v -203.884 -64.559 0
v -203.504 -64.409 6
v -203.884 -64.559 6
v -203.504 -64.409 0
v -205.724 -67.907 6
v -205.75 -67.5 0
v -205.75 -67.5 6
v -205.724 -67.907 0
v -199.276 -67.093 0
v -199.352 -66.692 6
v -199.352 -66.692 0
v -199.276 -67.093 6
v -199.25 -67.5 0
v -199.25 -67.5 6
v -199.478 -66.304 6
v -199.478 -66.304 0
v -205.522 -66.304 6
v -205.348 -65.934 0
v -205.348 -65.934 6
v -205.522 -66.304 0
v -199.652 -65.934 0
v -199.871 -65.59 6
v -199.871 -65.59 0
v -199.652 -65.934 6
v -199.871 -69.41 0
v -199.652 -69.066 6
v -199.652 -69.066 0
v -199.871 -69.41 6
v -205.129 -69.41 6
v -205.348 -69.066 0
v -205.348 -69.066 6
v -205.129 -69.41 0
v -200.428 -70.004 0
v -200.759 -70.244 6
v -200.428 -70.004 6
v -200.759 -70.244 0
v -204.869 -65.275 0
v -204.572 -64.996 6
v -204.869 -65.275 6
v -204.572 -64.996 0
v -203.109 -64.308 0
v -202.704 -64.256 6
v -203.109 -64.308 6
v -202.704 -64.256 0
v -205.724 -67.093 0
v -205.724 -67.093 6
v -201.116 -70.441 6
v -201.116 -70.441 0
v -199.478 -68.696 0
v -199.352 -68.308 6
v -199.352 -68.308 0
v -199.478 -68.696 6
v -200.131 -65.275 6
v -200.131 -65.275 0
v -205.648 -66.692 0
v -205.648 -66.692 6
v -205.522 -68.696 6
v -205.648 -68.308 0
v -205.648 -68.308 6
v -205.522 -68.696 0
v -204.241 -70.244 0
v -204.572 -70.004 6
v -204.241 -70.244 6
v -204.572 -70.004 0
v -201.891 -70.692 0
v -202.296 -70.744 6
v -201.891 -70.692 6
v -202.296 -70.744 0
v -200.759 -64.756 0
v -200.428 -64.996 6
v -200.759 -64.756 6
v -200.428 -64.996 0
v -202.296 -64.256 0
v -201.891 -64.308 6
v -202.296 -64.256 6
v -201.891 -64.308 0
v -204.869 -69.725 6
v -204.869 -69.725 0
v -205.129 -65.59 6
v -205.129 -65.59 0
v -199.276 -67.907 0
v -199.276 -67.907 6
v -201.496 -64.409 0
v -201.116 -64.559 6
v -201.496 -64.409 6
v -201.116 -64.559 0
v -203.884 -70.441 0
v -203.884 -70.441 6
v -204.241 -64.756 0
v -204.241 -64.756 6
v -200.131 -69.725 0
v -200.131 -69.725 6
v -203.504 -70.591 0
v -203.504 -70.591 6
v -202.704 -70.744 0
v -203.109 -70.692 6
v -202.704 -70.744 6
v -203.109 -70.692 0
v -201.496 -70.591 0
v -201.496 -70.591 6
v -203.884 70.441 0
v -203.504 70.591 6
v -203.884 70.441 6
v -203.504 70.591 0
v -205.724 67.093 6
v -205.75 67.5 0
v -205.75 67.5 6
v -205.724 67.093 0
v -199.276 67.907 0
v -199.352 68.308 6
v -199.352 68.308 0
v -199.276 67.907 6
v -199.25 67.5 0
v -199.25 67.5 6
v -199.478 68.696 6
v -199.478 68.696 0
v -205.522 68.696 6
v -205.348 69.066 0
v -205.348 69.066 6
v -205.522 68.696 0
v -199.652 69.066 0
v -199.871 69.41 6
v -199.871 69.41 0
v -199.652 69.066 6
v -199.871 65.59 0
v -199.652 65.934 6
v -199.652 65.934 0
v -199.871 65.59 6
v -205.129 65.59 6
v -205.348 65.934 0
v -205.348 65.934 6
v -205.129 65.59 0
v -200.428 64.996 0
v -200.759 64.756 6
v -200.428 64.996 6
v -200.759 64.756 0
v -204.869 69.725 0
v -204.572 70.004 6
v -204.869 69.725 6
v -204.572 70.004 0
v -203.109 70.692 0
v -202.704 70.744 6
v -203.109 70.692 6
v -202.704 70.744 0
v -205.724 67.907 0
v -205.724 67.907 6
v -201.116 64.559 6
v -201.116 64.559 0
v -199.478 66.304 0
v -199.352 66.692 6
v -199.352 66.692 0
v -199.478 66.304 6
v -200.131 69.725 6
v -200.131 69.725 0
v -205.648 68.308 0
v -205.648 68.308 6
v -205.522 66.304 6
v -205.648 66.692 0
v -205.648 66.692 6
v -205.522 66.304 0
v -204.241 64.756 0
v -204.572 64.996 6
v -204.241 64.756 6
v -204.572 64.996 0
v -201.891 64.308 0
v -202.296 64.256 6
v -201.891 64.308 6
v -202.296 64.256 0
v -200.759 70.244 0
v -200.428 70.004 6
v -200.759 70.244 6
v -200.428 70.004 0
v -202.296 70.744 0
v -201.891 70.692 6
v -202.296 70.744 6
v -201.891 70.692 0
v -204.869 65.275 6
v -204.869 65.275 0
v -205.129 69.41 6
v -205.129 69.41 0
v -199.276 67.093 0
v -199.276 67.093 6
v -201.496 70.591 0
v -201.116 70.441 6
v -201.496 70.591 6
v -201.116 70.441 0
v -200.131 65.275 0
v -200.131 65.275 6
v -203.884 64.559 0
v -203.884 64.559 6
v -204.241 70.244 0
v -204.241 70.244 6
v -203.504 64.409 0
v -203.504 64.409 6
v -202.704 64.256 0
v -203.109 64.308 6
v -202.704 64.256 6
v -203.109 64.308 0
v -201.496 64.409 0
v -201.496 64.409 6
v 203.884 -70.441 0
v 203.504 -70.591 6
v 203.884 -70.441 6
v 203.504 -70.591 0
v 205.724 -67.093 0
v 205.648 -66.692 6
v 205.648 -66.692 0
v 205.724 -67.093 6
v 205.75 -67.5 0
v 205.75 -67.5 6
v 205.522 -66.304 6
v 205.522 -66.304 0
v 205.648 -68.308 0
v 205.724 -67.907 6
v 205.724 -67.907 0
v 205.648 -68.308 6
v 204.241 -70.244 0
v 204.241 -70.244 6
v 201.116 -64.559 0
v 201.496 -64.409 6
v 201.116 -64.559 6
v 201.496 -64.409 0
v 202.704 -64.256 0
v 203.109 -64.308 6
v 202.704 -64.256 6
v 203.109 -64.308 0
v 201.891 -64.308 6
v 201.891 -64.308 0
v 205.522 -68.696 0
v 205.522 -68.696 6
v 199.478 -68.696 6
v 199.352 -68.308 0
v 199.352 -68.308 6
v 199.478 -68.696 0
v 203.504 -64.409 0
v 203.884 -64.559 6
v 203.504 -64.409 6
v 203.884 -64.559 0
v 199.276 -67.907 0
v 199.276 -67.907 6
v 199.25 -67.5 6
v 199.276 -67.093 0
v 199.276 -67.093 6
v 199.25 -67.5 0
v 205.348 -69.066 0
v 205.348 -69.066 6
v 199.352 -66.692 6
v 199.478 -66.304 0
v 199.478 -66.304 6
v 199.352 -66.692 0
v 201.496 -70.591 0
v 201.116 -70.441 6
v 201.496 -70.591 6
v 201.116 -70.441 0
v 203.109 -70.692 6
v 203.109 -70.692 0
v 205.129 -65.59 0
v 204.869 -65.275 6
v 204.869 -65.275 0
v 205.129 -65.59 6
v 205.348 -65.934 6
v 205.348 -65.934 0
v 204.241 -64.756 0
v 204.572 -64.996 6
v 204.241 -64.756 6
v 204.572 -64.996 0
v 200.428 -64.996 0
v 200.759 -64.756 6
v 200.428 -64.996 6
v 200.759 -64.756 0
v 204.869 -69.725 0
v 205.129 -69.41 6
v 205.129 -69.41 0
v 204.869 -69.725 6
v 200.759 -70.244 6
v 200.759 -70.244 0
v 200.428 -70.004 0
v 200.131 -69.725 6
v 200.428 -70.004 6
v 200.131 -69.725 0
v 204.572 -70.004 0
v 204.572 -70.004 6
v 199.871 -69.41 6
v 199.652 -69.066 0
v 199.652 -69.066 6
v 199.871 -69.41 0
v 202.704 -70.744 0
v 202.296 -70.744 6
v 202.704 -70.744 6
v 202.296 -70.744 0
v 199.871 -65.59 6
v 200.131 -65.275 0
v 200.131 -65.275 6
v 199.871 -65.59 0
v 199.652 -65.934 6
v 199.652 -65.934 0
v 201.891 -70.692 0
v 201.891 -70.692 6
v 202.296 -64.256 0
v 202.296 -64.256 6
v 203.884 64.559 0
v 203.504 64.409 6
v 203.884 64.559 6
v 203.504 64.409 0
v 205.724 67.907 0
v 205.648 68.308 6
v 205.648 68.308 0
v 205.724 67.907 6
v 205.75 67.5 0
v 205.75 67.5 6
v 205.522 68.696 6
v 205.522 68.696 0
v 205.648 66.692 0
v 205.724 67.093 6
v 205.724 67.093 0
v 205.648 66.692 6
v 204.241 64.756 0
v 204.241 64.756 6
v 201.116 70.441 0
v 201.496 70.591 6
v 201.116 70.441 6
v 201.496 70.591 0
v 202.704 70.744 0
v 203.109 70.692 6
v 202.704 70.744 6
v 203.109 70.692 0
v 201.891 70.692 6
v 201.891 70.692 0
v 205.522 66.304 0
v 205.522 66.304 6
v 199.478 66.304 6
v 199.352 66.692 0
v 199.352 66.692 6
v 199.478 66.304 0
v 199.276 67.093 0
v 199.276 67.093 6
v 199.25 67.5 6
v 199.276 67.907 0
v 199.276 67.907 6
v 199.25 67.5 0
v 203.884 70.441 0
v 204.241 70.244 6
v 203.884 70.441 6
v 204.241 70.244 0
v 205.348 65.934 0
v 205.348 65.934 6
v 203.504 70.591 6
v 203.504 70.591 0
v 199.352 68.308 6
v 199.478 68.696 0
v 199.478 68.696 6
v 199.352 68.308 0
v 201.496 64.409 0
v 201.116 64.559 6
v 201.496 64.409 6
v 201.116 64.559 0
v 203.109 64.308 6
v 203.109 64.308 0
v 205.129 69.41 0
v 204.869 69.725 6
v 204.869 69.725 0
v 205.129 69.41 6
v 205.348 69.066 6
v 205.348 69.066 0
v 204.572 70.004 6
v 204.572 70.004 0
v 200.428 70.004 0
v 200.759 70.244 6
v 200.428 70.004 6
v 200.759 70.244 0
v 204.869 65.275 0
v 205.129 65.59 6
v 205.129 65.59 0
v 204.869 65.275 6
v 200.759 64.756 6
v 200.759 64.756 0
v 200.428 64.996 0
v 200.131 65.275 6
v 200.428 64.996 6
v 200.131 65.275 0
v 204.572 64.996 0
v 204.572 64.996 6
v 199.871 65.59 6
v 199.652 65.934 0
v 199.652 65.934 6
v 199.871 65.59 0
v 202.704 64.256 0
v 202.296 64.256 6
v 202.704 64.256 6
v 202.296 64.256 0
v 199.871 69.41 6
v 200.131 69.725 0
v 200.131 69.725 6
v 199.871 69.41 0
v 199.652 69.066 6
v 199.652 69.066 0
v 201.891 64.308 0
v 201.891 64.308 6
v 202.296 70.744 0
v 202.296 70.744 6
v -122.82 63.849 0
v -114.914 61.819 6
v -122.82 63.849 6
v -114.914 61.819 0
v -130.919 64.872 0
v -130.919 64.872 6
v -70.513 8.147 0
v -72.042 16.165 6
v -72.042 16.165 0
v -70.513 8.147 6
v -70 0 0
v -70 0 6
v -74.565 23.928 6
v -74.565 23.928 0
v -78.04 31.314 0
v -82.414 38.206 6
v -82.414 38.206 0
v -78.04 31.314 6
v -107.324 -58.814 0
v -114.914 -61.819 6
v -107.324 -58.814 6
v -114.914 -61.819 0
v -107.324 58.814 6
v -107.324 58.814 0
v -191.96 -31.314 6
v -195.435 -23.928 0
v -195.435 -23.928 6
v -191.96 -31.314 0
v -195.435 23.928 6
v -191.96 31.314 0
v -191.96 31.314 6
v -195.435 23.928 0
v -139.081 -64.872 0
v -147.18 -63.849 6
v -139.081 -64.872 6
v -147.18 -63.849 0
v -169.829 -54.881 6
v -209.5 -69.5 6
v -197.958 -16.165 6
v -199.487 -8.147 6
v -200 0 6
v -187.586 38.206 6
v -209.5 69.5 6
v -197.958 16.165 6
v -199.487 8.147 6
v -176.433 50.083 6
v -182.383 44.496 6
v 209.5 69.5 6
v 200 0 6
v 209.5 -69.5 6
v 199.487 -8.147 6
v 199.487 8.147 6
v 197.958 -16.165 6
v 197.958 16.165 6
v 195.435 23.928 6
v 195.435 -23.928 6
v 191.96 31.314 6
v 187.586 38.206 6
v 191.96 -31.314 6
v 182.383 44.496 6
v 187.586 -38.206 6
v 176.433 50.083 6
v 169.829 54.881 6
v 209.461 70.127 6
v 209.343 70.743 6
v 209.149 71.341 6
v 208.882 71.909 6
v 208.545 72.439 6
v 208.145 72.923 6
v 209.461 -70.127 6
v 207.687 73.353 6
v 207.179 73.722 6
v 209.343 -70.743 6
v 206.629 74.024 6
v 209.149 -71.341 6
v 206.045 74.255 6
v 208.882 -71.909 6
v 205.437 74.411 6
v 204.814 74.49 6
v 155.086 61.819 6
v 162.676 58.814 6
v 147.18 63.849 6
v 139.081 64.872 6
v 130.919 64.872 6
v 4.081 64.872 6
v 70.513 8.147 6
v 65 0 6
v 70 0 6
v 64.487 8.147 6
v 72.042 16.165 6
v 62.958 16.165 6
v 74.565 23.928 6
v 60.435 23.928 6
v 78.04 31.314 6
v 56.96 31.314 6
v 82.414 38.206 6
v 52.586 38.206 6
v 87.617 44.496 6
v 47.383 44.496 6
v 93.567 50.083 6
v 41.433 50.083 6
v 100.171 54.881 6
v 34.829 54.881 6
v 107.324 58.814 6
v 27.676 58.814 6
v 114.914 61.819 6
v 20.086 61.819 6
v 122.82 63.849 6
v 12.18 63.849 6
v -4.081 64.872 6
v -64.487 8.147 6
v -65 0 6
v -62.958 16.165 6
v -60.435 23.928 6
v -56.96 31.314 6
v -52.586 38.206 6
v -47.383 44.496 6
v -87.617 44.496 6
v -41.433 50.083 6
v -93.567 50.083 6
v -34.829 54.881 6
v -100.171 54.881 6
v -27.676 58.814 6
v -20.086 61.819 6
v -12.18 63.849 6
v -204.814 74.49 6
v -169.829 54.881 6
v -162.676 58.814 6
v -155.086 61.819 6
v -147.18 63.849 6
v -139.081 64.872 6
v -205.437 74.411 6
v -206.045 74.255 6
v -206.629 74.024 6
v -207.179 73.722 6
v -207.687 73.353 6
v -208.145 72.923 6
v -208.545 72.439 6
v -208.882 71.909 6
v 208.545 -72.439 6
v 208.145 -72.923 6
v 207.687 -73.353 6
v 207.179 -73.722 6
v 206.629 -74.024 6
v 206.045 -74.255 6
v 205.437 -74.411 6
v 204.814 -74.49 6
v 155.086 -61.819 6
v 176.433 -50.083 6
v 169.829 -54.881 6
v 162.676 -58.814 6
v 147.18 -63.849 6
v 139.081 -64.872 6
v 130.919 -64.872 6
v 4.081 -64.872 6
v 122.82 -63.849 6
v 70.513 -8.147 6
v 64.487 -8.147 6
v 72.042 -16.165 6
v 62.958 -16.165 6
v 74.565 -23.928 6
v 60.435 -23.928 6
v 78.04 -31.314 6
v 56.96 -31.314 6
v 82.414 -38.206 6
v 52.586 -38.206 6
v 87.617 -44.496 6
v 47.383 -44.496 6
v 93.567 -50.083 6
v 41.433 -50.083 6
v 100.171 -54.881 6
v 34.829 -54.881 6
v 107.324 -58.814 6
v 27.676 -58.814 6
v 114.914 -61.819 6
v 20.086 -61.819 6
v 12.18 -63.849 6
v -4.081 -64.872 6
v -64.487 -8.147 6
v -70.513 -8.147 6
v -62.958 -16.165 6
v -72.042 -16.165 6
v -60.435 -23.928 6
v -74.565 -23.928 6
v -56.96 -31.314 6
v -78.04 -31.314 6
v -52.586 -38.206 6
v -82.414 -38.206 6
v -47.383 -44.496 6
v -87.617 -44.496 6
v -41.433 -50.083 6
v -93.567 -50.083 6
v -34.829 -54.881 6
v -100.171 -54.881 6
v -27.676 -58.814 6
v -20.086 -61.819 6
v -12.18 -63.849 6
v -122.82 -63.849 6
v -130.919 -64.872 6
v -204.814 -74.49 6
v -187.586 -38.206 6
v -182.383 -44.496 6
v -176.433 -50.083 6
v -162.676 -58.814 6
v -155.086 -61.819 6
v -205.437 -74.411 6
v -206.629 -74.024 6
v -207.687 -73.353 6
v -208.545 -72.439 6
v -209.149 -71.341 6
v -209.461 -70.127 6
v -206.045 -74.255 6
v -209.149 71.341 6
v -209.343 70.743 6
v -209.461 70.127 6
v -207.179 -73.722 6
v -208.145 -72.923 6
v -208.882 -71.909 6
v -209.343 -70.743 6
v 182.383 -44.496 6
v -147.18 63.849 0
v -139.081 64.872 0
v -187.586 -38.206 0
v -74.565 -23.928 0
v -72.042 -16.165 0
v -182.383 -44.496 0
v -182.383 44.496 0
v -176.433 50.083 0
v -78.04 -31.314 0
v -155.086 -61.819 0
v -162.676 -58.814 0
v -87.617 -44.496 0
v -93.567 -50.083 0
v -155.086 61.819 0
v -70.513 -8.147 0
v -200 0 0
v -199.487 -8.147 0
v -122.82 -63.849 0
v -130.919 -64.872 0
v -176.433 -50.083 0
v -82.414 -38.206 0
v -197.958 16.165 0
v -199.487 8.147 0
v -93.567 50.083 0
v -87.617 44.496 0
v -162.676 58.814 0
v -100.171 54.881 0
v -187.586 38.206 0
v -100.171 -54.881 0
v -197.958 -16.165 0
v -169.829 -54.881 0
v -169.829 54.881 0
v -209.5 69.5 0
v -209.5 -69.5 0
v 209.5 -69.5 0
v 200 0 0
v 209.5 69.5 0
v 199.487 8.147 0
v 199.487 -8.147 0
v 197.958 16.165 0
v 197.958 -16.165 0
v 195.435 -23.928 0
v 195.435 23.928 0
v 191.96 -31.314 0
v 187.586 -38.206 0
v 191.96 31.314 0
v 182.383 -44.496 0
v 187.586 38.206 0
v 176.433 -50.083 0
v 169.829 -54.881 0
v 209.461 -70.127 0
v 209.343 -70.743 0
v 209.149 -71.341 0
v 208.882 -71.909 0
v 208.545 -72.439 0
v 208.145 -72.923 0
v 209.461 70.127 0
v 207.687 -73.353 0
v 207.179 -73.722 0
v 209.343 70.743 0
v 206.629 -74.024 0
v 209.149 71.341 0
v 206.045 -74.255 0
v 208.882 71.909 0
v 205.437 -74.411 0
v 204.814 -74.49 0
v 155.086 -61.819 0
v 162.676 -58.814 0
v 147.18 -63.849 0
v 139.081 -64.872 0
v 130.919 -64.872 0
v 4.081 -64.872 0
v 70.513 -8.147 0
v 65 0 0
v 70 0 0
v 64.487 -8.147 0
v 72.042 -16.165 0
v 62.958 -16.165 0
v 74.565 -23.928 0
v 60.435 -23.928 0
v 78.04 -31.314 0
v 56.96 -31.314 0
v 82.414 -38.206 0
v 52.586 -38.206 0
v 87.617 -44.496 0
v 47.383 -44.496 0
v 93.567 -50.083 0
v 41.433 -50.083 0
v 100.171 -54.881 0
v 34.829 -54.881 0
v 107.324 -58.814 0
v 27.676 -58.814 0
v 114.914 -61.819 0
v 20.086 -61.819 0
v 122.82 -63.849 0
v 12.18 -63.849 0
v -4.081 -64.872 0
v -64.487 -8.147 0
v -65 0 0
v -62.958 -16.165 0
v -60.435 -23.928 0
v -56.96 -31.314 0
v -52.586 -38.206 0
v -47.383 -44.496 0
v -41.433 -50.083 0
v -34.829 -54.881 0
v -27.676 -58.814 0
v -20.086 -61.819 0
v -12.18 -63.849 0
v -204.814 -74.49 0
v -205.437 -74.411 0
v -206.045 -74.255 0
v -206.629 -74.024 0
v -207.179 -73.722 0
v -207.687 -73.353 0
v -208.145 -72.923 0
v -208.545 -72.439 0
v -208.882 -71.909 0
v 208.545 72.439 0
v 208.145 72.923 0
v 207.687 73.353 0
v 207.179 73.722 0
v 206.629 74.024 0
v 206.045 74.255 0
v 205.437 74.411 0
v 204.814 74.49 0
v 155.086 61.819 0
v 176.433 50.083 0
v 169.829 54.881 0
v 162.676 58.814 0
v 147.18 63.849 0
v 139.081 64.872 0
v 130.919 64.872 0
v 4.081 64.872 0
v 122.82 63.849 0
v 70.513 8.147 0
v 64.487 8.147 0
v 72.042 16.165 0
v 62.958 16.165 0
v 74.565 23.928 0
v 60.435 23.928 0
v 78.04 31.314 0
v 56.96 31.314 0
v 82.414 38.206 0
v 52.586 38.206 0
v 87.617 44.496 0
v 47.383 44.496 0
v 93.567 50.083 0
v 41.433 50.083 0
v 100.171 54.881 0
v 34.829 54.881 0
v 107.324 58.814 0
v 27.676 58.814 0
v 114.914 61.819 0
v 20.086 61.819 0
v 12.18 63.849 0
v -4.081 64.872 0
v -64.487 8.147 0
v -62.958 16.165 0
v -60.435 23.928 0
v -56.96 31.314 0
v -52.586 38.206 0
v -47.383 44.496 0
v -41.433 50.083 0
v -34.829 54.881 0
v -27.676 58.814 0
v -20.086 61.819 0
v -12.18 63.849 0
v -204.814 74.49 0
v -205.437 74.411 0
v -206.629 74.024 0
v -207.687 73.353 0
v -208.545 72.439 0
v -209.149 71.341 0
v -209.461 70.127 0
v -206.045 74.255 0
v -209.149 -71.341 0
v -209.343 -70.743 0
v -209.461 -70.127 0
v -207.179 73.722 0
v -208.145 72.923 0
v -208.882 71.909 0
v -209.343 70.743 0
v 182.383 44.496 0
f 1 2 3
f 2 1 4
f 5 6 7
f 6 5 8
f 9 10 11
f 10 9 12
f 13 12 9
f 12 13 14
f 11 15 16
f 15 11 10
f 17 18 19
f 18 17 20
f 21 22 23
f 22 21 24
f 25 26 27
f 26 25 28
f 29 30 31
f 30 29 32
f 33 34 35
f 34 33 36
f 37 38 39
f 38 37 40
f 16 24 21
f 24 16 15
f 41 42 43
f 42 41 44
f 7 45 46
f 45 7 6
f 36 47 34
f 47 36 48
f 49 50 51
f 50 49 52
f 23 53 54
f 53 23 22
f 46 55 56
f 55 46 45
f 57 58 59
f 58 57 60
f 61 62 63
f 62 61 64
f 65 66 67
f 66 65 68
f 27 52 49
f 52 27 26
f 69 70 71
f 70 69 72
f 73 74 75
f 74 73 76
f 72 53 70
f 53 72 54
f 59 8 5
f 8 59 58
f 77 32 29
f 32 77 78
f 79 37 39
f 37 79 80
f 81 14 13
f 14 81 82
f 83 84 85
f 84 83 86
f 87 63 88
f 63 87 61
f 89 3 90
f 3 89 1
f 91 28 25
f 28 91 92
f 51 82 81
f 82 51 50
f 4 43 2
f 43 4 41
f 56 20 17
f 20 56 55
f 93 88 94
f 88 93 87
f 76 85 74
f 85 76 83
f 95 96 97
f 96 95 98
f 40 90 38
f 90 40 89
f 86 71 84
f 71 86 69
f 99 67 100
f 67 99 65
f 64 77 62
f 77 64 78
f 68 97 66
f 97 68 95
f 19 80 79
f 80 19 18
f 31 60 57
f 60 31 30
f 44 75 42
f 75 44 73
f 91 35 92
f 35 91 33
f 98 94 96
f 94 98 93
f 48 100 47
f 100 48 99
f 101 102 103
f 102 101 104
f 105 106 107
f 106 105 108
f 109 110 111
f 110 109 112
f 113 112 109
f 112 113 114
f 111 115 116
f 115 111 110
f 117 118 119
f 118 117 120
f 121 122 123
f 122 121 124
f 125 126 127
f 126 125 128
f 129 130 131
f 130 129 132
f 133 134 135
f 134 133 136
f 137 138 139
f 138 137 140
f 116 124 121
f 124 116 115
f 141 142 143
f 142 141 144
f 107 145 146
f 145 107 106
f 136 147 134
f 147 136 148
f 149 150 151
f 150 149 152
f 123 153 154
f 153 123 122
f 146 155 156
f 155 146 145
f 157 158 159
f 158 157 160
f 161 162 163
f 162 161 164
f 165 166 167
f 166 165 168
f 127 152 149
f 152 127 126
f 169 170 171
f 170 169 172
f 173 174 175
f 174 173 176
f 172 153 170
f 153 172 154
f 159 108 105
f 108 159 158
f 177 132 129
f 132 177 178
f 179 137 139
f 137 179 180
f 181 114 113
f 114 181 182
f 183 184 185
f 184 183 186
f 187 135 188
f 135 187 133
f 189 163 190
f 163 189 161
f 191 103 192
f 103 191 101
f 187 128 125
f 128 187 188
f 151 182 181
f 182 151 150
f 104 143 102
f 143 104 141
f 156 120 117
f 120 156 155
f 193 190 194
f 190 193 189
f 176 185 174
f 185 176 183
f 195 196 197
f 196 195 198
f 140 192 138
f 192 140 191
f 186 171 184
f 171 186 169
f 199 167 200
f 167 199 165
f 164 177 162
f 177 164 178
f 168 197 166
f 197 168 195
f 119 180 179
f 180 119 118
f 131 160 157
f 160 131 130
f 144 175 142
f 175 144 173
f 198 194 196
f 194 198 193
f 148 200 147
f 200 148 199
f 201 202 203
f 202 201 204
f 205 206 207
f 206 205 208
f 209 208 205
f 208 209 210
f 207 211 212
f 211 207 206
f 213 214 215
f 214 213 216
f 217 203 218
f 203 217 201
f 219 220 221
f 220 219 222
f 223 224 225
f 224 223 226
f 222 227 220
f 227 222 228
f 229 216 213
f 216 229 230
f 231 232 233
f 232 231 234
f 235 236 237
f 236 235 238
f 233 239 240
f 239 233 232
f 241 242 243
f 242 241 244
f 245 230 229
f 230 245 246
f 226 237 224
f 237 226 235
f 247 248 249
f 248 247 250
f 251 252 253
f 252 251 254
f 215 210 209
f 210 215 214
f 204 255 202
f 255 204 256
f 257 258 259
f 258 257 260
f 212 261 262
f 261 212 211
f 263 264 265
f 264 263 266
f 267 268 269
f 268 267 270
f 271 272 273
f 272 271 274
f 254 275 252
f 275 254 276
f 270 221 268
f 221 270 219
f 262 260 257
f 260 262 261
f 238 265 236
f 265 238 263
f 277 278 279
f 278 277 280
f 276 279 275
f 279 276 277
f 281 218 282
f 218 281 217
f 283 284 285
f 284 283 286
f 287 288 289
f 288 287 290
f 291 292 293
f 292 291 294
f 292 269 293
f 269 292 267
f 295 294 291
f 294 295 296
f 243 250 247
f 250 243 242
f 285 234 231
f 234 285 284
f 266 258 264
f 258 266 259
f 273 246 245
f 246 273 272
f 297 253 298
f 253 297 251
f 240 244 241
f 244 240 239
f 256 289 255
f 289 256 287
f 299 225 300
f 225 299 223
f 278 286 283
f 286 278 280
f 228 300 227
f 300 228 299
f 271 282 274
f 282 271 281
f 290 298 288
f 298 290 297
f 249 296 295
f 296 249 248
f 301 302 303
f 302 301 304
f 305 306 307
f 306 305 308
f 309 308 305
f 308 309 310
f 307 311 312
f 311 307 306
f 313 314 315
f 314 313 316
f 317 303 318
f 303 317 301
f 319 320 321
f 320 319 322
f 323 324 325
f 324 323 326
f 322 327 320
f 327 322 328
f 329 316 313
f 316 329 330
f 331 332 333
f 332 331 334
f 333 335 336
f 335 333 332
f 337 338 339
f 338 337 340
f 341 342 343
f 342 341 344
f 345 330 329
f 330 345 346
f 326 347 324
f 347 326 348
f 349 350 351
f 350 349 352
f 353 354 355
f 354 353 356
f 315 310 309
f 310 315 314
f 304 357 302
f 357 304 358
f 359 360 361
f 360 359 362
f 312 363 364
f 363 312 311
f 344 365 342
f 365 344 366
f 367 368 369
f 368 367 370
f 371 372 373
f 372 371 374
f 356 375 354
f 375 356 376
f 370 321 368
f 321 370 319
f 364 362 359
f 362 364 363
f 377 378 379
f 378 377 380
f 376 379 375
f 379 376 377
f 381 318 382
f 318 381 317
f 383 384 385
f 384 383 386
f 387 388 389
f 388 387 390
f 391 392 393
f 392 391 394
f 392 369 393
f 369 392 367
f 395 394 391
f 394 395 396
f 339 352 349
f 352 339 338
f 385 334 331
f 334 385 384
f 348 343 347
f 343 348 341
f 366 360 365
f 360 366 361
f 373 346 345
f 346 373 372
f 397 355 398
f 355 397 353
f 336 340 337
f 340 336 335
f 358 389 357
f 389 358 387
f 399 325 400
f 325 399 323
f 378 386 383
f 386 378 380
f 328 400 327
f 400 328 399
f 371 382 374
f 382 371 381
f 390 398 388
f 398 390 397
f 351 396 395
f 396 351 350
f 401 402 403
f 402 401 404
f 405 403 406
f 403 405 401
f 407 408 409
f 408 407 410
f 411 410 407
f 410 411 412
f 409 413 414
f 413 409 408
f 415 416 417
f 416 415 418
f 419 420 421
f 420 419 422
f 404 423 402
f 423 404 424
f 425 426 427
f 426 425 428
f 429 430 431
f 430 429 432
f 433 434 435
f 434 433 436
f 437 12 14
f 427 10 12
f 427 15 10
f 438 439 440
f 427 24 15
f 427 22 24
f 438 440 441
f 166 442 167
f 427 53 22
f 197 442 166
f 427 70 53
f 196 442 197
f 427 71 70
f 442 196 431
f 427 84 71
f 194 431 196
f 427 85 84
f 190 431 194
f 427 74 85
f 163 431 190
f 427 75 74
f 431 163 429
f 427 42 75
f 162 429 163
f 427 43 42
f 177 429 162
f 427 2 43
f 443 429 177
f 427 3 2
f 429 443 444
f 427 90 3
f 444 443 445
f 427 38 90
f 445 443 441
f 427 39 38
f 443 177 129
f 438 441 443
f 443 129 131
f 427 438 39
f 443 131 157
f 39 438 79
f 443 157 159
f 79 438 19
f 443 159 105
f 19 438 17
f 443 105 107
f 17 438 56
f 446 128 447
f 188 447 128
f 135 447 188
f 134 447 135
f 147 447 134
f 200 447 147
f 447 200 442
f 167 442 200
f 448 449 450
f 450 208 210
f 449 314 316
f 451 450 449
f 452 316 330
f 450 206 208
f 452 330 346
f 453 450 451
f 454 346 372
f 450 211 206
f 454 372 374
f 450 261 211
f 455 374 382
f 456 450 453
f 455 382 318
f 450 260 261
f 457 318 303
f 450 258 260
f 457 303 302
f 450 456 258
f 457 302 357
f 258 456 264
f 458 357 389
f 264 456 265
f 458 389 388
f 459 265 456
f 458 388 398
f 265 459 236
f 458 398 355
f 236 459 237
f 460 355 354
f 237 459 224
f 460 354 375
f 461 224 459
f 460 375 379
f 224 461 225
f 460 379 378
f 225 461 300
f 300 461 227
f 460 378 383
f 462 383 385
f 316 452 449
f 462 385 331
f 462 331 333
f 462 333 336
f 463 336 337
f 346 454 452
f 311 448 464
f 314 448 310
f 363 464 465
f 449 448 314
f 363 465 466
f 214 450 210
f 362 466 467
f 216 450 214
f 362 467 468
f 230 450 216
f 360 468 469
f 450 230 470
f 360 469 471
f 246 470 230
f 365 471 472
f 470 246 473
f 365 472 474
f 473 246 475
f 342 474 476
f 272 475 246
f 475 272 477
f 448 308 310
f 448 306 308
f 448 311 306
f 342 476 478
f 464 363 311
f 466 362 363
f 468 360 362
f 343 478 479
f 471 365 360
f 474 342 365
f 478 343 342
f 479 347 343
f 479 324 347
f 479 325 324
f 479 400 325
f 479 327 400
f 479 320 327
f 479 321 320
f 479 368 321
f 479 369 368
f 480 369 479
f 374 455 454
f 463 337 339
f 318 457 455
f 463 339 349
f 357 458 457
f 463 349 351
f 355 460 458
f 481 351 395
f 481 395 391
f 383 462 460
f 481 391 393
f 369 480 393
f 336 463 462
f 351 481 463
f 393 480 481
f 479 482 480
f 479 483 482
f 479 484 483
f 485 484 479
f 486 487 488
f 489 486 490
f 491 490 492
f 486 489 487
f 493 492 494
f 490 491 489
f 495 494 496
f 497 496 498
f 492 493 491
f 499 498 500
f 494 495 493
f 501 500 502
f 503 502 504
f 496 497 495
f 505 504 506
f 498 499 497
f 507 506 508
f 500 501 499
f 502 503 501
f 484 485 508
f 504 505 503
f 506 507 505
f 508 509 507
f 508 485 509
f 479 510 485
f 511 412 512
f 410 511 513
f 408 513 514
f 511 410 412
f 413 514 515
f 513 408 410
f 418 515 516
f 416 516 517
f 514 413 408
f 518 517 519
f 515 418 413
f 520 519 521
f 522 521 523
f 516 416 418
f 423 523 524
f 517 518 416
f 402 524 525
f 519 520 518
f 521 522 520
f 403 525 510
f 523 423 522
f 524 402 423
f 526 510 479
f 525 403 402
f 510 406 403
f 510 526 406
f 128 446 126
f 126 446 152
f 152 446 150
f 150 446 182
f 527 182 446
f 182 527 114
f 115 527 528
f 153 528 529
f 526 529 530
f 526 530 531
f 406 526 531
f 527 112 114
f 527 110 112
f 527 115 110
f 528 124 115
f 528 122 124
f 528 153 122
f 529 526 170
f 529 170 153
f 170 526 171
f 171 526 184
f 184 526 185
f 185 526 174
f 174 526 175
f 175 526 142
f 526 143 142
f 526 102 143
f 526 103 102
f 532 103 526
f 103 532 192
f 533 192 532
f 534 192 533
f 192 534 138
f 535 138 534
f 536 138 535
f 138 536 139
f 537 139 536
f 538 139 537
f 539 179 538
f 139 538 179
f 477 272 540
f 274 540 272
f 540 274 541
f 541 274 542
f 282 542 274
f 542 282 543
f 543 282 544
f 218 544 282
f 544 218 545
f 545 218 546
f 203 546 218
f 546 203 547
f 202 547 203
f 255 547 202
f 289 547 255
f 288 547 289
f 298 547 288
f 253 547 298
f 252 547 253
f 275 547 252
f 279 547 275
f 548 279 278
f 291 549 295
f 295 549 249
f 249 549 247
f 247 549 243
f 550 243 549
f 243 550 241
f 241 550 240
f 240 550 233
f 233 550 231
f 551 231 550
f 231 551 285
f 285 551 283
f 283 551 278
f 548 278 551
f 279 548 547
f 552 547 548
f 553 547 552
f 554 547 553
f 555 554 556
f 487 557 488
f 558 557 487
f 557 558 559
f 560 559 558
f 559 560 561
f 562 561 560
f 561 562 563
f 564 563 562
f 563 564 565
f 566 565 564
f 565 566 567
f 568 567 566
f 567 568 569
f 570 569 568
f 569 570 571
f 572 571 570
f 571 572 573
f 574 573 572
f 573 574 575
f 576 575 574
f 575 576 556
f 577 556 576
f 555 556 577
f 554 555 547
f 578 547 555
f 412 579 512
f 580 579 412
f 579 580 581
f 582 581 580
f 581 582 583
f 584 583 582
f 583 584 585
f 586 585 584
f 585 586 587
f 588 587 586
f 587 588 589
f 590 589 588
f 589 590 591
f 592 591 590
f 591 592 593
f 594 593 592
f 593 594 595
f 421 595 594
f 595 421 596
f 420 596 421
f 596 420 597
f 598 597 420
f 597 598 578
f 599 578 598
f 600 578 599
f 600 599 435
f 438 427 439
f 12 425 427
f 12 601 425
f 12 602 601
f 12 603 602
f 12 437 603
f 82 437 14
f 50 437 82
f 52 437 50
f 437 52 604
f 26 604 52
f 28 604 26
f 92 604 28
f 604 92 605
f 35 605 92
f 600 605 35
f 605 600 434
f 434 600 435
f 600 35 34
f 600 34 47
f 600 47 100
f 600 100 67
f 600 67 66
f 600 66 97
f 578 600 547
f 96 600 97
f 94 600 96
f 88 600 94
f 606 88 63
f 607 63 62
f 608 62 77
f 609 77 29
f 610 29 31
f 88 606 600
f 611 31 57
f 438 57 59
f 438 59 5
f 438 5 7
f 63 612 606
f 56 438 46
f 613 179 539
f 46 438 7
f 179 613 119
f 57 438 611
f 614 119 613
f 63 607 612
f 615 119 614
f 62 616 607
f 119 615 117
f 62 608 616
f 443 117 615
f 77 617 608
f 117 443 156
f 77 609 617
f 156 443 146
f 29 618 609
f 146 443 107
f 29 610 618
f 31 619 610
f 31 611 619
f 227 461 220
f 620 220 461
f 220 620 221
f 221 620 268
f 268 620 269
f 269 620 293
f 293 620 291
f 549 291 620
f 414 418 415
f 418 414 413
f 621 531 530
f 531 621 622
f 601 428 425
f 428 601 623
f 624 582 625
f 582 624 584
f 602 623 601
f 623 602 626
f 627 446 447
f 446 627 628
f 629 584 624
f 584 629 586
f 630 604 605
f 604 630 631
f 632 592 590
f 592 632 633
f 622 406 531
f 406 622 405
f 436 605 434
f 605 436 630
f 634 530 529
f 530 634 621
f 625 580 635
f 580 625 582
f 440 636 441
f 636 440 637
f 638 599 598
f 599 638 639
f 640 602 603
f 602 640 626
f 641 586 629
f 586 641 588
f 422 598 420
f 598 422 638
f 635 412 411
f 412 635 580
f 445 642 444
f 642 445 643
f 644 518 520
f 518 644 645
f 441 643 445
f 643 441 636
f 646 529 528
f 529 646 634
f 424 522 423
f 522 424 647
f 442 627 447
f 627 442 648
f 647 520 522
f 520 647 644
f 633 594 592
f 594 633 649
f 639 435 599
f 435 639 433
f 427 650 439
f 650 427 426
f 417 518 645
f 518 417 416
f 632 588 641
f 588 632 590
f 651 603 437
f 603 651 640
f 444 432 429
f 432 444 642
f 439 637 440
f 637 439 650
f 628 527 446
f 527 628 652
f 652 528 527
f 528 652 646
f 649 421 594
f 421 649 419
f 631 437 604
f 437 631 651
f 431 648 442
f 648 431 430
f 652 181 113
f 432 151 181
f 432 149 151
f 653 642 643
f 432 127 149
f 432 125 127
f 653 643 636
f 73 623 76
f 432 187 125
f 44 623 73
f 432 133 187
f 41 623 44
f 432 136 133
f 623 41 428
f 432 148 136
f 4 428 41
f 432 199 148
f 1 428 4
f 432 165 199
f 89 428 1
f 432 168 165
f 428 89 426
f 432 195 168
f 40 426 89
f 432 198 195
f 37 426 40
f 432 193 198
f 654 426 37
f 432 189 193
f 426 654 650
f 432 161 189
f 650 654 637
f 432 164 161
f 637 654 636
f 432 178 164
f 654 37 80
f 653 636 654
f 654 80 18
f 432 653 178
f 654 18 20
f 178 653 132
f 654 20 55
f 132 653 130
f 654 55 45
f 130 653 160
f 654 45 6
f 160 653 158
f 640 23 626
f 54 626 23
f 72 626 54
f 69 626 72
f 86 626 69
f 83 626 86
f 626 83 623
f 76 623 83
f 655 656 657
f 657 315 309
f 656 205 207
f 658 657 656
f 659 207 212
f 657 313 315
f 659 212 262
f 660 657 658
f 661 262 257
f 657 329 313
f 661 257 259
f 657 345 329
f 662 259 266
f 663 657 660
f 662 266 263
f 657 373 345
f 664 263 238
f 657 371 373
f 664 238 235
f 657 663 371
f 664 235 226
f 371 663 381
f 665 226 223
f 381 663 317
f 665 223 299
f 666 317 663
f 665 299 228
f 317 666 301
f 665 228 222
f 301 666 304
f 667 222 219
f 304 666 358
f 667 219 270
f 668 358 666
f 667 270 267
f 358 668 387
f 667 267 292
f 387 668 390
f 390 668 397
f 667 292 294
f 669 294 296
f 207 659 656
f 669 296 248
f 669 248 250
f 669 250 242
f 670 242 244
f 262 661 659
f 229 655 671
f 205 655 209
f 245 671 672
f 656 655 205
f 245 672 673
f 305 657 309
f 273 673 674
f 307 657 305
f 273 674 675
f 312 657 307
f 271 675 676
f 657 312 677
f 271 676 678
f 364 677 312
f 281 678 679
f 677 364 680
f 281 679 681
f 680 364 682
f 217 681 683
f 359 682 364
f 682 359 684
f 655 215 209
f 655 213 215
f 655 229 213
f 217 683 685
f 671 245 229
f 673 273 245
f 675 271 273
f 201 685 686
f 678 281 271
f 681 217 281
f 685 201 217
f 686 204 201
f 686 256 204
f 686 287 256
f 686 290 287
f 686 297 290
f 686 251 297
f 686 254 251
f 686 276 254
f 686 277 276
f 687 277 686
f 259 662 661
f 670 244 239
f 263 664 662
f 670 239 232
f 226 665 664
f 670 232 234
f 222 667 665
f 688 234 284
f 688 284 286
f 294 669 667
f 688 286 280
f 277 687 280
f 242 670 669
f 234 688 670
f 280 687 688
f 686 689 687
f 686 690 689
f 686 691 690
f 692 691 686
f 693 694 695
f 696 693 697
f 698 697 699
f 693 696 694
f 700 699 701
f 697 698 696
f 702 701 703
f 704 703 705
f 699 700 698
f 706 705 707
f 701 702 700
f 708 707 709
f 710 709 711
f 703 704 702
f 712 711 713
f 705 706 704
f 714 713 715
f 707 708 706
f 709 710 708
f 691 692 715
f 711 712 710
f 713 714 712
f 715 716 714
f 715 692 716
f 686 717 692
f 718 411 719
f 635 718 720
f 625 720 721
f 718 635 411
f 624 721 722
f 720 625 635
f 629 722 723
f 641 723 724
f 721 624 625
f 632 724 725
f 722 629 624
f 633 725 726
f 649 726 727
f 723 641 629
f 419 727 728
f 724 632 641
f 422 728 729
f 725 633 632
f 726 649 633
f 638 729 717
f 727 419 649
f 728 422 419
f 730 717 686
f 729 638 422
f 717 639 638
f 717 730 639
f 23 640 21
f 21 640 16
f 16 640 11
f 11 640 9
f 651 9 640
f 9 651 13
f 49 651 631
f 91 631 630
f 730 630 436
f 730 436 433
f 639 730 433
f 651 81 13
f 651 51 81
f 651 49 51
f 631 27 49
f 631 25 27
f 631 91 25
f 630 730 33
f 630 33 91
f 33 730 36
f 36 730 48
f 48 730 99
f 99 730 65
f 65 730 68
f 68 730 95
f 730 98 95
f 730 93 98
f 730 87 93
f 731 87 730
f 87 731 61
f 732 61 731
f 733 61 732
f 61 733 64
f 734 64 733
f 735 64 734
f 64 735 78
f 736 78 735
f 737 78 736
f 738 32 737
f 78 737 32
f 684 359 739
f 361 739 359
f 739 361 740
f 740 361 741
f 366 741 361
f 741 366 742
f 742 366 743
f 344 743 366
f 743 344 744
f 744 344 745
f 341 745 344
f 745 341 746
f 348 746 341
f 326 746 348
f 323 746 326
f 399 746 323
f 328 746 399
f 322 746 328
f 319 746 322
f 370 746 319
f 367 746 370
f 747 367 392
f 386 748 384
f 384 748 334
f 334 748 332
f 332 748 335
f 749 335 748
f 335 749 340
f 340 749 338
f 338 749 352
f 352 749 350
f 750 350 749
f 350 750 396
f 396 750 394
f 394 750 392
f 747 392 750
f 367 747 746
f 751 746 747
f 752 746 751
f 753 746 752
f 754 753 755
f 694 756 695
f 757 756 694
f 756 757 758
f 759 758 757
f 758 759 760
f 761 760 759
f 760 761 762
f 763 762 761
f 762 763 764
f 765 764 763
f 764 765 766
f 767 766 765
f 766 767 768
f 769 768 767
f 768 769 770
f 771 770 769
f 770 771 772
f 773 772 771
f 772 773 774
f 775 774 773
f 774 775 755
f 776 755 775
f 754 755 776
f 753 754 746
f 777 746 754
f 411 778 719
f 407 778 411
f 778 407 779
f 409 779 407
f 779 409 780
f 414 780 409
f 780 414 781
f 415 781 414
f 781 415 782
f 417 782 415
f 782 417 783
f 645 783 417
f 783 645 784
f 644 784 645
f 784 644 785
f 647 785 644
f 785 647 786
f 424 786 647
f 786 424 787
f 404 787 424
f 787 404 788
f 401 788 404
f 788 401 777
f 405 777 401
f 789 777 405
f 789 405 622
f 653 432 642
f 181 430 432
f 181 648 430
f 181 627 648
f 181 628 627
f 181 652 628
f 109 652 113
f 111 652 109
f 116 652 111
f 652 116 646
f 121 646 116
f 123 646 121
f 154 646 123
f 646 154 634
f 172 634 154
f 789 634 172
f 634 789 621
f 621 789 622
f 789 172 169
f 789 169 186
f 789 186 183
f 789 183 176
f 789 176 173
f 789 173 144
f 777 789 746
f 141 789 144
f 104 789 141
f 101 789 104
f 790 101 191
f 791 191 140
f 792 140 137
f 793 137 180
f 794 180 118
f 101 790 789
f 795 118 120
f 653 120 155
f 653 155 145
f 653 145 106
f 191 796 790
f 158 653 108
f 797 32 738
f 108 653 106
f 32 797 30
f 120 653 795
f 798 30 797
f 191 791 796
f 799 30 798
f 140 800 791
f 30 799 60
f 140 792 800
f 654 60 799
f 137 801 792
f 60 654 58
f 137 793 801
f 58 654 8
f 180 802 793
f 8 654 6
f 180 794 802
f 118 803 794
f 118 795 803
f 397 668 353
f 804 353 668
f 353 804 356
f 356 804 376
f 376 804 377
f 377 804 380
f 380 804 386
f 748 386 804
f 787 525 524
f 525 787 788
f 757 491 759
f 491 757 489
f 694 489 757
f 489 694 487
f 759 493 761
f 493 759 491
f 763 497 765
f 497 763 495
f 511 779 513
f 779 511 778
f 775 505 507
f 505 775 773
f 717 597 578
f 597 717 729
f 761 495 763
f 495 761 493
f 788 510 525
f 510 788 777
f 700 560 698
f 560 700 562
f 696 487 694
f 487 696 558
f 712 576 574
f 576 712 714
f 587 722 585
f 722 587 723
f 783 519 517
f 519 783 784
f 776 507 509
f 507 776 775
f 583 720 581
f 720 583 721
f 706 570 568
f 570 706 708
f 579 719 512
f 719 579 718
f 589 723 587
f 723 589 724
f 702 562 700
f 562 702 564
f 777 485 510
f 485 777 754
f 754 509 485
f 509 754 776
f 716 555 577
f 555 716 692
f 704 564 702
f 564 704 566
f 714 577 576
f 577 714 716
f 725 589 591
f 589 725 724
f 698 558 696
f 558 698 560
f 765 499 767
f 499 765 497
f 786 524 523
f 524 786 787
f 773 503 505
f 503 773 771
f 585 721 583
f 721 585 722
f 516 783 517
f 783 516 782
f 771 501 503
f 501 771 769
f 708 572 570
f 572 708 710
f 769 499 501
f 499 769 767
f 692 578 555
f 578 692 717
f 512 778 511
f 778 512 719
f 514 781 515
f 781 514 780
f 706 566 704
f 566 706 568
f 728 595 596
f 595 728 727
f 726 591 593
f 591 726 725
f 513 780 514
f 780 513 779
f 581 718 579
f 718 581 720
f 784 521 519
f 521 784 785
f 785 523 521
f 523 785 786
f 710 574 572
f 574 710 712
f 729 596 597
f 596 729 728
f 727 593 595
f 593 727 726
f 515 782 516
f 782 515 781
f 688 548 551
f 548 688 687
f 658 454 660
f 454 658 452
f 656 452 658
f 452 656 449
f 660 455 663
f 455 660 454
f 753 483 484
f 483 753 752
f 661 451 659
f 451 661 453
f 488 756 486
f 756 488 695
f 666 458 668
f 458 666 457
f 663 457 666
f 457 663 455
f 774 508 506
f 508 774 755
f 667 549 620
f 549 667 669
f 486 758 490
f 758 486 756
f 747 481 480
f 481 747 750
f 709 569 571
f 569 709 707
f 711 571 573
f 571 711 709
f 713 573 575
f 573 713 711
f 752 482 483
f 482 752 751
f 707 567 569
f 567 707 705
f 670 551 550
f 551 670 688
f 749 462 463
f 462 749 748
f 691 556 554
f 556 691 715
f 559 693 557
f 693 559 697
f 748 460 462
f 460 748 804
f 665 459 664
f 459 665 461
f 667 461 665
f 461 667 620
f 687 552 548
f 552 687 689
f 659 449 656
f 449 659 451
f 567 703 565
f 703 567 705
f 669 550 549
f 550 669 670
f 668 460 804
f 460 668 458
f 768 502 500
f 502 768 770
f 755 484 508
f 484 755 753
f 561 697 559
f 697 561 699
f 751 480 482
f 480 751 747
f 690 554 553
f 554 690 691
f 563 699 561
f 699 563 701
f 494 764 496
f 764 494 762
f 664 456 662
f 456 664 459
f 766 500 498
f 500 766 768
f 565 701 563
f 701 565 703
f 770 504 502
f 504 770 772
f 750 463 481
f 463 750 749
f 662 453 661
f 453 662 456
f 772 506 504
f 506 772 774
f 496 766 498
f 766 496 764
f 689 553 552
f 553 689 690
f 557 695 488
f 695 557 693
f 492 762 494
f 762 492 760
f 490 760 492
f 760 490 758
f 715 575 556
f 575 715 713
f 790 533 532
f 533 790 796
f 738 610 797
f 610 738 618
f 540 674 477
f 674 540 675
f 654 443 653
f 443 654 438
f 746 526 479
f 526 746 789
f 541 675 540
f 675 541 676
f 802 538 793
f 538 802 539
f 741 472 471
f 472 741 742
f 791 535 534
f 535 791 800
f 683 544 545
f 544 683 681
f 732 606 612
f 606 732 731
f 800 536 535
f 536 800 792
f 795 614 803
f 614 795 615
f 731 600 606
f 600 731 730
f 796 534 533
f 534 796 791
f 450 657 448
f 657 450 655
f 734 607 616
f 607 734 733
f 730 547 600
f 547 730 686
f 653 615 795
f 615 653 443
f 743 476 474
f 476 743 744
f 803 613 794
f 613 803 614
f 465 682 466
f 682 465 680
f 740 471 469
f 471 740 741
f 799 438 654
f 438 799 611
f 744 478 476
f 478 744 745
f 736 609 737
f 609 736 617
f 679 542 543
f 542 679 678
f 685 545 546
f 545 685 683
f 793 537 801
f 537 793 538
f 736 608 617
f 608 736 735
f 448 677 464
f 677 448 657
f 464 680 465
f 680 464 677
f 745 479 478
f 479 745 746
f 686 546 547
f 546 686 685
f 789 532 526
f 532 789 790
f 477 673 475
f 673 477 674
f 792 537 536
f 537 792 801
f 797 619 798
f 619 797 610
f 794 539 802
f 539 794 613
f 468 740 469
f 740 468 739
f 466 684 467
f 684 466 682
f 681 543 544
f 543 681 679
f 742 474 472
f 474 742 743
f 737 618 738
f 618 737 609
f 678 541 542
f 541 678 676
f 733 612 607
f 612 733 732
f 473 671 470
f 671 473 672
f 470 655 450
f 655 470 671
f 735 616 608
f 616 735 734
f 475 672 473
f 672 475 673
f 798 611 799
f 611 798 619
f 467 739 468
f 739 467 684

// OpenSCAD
$fn = 50;


difference() {
	union() {
		hull() {
			translate(v = [-204.5000000000, 69.5000000000, 0]) {
				cylinder(h = 6, r = 5);
			}
			translate(v = [204.5000000000, 69.5000000000, 0]) {
				cylinder(h = 6, r = 5);
			}
			translate(v = [-204.5000000000, -69.5000000000, 0]) {
				cylinder(h = 6, r = 5);
			}
			translate(v = [204.5000000000, -69.5000000000, 0]) {
				cylinder(h = 6, r = 5);
			}
		}
	}
	union() {
		#translate(v = [-202.5000000000, -67.5000000000, -100.0000000000]) {
			cylinder(h = 200, r = 3.2500000000);
		}
		#translate(v = [-202.5000000000, 67.5000000000, -100.0000000000]) {
			cylinder(h = 200, r = 3.2500000000);
		}
		#translate(v = [202.5000000000, -67.5000000000, -100.0000000000]) {
			cylinder(h = 200, r = 3.2500000000);
		}
		#translate(v = [202.5000000000, 67.5000000000, -100.0000000000]) {
			cylinder(h = 200, r = 3.2500000000);
		}
		#translate(v = [-135.0000000000, 0, 0]) {
			cylinder(h = 6, r = 65.0000000000);
		}
		#cylinder(h = 6, r = 65.0000000000);
		#translate(v = [135.0000000000, 0, 0]) {
			cylinder(h = 6, r = 65.0000000000);
		}
	}
}
